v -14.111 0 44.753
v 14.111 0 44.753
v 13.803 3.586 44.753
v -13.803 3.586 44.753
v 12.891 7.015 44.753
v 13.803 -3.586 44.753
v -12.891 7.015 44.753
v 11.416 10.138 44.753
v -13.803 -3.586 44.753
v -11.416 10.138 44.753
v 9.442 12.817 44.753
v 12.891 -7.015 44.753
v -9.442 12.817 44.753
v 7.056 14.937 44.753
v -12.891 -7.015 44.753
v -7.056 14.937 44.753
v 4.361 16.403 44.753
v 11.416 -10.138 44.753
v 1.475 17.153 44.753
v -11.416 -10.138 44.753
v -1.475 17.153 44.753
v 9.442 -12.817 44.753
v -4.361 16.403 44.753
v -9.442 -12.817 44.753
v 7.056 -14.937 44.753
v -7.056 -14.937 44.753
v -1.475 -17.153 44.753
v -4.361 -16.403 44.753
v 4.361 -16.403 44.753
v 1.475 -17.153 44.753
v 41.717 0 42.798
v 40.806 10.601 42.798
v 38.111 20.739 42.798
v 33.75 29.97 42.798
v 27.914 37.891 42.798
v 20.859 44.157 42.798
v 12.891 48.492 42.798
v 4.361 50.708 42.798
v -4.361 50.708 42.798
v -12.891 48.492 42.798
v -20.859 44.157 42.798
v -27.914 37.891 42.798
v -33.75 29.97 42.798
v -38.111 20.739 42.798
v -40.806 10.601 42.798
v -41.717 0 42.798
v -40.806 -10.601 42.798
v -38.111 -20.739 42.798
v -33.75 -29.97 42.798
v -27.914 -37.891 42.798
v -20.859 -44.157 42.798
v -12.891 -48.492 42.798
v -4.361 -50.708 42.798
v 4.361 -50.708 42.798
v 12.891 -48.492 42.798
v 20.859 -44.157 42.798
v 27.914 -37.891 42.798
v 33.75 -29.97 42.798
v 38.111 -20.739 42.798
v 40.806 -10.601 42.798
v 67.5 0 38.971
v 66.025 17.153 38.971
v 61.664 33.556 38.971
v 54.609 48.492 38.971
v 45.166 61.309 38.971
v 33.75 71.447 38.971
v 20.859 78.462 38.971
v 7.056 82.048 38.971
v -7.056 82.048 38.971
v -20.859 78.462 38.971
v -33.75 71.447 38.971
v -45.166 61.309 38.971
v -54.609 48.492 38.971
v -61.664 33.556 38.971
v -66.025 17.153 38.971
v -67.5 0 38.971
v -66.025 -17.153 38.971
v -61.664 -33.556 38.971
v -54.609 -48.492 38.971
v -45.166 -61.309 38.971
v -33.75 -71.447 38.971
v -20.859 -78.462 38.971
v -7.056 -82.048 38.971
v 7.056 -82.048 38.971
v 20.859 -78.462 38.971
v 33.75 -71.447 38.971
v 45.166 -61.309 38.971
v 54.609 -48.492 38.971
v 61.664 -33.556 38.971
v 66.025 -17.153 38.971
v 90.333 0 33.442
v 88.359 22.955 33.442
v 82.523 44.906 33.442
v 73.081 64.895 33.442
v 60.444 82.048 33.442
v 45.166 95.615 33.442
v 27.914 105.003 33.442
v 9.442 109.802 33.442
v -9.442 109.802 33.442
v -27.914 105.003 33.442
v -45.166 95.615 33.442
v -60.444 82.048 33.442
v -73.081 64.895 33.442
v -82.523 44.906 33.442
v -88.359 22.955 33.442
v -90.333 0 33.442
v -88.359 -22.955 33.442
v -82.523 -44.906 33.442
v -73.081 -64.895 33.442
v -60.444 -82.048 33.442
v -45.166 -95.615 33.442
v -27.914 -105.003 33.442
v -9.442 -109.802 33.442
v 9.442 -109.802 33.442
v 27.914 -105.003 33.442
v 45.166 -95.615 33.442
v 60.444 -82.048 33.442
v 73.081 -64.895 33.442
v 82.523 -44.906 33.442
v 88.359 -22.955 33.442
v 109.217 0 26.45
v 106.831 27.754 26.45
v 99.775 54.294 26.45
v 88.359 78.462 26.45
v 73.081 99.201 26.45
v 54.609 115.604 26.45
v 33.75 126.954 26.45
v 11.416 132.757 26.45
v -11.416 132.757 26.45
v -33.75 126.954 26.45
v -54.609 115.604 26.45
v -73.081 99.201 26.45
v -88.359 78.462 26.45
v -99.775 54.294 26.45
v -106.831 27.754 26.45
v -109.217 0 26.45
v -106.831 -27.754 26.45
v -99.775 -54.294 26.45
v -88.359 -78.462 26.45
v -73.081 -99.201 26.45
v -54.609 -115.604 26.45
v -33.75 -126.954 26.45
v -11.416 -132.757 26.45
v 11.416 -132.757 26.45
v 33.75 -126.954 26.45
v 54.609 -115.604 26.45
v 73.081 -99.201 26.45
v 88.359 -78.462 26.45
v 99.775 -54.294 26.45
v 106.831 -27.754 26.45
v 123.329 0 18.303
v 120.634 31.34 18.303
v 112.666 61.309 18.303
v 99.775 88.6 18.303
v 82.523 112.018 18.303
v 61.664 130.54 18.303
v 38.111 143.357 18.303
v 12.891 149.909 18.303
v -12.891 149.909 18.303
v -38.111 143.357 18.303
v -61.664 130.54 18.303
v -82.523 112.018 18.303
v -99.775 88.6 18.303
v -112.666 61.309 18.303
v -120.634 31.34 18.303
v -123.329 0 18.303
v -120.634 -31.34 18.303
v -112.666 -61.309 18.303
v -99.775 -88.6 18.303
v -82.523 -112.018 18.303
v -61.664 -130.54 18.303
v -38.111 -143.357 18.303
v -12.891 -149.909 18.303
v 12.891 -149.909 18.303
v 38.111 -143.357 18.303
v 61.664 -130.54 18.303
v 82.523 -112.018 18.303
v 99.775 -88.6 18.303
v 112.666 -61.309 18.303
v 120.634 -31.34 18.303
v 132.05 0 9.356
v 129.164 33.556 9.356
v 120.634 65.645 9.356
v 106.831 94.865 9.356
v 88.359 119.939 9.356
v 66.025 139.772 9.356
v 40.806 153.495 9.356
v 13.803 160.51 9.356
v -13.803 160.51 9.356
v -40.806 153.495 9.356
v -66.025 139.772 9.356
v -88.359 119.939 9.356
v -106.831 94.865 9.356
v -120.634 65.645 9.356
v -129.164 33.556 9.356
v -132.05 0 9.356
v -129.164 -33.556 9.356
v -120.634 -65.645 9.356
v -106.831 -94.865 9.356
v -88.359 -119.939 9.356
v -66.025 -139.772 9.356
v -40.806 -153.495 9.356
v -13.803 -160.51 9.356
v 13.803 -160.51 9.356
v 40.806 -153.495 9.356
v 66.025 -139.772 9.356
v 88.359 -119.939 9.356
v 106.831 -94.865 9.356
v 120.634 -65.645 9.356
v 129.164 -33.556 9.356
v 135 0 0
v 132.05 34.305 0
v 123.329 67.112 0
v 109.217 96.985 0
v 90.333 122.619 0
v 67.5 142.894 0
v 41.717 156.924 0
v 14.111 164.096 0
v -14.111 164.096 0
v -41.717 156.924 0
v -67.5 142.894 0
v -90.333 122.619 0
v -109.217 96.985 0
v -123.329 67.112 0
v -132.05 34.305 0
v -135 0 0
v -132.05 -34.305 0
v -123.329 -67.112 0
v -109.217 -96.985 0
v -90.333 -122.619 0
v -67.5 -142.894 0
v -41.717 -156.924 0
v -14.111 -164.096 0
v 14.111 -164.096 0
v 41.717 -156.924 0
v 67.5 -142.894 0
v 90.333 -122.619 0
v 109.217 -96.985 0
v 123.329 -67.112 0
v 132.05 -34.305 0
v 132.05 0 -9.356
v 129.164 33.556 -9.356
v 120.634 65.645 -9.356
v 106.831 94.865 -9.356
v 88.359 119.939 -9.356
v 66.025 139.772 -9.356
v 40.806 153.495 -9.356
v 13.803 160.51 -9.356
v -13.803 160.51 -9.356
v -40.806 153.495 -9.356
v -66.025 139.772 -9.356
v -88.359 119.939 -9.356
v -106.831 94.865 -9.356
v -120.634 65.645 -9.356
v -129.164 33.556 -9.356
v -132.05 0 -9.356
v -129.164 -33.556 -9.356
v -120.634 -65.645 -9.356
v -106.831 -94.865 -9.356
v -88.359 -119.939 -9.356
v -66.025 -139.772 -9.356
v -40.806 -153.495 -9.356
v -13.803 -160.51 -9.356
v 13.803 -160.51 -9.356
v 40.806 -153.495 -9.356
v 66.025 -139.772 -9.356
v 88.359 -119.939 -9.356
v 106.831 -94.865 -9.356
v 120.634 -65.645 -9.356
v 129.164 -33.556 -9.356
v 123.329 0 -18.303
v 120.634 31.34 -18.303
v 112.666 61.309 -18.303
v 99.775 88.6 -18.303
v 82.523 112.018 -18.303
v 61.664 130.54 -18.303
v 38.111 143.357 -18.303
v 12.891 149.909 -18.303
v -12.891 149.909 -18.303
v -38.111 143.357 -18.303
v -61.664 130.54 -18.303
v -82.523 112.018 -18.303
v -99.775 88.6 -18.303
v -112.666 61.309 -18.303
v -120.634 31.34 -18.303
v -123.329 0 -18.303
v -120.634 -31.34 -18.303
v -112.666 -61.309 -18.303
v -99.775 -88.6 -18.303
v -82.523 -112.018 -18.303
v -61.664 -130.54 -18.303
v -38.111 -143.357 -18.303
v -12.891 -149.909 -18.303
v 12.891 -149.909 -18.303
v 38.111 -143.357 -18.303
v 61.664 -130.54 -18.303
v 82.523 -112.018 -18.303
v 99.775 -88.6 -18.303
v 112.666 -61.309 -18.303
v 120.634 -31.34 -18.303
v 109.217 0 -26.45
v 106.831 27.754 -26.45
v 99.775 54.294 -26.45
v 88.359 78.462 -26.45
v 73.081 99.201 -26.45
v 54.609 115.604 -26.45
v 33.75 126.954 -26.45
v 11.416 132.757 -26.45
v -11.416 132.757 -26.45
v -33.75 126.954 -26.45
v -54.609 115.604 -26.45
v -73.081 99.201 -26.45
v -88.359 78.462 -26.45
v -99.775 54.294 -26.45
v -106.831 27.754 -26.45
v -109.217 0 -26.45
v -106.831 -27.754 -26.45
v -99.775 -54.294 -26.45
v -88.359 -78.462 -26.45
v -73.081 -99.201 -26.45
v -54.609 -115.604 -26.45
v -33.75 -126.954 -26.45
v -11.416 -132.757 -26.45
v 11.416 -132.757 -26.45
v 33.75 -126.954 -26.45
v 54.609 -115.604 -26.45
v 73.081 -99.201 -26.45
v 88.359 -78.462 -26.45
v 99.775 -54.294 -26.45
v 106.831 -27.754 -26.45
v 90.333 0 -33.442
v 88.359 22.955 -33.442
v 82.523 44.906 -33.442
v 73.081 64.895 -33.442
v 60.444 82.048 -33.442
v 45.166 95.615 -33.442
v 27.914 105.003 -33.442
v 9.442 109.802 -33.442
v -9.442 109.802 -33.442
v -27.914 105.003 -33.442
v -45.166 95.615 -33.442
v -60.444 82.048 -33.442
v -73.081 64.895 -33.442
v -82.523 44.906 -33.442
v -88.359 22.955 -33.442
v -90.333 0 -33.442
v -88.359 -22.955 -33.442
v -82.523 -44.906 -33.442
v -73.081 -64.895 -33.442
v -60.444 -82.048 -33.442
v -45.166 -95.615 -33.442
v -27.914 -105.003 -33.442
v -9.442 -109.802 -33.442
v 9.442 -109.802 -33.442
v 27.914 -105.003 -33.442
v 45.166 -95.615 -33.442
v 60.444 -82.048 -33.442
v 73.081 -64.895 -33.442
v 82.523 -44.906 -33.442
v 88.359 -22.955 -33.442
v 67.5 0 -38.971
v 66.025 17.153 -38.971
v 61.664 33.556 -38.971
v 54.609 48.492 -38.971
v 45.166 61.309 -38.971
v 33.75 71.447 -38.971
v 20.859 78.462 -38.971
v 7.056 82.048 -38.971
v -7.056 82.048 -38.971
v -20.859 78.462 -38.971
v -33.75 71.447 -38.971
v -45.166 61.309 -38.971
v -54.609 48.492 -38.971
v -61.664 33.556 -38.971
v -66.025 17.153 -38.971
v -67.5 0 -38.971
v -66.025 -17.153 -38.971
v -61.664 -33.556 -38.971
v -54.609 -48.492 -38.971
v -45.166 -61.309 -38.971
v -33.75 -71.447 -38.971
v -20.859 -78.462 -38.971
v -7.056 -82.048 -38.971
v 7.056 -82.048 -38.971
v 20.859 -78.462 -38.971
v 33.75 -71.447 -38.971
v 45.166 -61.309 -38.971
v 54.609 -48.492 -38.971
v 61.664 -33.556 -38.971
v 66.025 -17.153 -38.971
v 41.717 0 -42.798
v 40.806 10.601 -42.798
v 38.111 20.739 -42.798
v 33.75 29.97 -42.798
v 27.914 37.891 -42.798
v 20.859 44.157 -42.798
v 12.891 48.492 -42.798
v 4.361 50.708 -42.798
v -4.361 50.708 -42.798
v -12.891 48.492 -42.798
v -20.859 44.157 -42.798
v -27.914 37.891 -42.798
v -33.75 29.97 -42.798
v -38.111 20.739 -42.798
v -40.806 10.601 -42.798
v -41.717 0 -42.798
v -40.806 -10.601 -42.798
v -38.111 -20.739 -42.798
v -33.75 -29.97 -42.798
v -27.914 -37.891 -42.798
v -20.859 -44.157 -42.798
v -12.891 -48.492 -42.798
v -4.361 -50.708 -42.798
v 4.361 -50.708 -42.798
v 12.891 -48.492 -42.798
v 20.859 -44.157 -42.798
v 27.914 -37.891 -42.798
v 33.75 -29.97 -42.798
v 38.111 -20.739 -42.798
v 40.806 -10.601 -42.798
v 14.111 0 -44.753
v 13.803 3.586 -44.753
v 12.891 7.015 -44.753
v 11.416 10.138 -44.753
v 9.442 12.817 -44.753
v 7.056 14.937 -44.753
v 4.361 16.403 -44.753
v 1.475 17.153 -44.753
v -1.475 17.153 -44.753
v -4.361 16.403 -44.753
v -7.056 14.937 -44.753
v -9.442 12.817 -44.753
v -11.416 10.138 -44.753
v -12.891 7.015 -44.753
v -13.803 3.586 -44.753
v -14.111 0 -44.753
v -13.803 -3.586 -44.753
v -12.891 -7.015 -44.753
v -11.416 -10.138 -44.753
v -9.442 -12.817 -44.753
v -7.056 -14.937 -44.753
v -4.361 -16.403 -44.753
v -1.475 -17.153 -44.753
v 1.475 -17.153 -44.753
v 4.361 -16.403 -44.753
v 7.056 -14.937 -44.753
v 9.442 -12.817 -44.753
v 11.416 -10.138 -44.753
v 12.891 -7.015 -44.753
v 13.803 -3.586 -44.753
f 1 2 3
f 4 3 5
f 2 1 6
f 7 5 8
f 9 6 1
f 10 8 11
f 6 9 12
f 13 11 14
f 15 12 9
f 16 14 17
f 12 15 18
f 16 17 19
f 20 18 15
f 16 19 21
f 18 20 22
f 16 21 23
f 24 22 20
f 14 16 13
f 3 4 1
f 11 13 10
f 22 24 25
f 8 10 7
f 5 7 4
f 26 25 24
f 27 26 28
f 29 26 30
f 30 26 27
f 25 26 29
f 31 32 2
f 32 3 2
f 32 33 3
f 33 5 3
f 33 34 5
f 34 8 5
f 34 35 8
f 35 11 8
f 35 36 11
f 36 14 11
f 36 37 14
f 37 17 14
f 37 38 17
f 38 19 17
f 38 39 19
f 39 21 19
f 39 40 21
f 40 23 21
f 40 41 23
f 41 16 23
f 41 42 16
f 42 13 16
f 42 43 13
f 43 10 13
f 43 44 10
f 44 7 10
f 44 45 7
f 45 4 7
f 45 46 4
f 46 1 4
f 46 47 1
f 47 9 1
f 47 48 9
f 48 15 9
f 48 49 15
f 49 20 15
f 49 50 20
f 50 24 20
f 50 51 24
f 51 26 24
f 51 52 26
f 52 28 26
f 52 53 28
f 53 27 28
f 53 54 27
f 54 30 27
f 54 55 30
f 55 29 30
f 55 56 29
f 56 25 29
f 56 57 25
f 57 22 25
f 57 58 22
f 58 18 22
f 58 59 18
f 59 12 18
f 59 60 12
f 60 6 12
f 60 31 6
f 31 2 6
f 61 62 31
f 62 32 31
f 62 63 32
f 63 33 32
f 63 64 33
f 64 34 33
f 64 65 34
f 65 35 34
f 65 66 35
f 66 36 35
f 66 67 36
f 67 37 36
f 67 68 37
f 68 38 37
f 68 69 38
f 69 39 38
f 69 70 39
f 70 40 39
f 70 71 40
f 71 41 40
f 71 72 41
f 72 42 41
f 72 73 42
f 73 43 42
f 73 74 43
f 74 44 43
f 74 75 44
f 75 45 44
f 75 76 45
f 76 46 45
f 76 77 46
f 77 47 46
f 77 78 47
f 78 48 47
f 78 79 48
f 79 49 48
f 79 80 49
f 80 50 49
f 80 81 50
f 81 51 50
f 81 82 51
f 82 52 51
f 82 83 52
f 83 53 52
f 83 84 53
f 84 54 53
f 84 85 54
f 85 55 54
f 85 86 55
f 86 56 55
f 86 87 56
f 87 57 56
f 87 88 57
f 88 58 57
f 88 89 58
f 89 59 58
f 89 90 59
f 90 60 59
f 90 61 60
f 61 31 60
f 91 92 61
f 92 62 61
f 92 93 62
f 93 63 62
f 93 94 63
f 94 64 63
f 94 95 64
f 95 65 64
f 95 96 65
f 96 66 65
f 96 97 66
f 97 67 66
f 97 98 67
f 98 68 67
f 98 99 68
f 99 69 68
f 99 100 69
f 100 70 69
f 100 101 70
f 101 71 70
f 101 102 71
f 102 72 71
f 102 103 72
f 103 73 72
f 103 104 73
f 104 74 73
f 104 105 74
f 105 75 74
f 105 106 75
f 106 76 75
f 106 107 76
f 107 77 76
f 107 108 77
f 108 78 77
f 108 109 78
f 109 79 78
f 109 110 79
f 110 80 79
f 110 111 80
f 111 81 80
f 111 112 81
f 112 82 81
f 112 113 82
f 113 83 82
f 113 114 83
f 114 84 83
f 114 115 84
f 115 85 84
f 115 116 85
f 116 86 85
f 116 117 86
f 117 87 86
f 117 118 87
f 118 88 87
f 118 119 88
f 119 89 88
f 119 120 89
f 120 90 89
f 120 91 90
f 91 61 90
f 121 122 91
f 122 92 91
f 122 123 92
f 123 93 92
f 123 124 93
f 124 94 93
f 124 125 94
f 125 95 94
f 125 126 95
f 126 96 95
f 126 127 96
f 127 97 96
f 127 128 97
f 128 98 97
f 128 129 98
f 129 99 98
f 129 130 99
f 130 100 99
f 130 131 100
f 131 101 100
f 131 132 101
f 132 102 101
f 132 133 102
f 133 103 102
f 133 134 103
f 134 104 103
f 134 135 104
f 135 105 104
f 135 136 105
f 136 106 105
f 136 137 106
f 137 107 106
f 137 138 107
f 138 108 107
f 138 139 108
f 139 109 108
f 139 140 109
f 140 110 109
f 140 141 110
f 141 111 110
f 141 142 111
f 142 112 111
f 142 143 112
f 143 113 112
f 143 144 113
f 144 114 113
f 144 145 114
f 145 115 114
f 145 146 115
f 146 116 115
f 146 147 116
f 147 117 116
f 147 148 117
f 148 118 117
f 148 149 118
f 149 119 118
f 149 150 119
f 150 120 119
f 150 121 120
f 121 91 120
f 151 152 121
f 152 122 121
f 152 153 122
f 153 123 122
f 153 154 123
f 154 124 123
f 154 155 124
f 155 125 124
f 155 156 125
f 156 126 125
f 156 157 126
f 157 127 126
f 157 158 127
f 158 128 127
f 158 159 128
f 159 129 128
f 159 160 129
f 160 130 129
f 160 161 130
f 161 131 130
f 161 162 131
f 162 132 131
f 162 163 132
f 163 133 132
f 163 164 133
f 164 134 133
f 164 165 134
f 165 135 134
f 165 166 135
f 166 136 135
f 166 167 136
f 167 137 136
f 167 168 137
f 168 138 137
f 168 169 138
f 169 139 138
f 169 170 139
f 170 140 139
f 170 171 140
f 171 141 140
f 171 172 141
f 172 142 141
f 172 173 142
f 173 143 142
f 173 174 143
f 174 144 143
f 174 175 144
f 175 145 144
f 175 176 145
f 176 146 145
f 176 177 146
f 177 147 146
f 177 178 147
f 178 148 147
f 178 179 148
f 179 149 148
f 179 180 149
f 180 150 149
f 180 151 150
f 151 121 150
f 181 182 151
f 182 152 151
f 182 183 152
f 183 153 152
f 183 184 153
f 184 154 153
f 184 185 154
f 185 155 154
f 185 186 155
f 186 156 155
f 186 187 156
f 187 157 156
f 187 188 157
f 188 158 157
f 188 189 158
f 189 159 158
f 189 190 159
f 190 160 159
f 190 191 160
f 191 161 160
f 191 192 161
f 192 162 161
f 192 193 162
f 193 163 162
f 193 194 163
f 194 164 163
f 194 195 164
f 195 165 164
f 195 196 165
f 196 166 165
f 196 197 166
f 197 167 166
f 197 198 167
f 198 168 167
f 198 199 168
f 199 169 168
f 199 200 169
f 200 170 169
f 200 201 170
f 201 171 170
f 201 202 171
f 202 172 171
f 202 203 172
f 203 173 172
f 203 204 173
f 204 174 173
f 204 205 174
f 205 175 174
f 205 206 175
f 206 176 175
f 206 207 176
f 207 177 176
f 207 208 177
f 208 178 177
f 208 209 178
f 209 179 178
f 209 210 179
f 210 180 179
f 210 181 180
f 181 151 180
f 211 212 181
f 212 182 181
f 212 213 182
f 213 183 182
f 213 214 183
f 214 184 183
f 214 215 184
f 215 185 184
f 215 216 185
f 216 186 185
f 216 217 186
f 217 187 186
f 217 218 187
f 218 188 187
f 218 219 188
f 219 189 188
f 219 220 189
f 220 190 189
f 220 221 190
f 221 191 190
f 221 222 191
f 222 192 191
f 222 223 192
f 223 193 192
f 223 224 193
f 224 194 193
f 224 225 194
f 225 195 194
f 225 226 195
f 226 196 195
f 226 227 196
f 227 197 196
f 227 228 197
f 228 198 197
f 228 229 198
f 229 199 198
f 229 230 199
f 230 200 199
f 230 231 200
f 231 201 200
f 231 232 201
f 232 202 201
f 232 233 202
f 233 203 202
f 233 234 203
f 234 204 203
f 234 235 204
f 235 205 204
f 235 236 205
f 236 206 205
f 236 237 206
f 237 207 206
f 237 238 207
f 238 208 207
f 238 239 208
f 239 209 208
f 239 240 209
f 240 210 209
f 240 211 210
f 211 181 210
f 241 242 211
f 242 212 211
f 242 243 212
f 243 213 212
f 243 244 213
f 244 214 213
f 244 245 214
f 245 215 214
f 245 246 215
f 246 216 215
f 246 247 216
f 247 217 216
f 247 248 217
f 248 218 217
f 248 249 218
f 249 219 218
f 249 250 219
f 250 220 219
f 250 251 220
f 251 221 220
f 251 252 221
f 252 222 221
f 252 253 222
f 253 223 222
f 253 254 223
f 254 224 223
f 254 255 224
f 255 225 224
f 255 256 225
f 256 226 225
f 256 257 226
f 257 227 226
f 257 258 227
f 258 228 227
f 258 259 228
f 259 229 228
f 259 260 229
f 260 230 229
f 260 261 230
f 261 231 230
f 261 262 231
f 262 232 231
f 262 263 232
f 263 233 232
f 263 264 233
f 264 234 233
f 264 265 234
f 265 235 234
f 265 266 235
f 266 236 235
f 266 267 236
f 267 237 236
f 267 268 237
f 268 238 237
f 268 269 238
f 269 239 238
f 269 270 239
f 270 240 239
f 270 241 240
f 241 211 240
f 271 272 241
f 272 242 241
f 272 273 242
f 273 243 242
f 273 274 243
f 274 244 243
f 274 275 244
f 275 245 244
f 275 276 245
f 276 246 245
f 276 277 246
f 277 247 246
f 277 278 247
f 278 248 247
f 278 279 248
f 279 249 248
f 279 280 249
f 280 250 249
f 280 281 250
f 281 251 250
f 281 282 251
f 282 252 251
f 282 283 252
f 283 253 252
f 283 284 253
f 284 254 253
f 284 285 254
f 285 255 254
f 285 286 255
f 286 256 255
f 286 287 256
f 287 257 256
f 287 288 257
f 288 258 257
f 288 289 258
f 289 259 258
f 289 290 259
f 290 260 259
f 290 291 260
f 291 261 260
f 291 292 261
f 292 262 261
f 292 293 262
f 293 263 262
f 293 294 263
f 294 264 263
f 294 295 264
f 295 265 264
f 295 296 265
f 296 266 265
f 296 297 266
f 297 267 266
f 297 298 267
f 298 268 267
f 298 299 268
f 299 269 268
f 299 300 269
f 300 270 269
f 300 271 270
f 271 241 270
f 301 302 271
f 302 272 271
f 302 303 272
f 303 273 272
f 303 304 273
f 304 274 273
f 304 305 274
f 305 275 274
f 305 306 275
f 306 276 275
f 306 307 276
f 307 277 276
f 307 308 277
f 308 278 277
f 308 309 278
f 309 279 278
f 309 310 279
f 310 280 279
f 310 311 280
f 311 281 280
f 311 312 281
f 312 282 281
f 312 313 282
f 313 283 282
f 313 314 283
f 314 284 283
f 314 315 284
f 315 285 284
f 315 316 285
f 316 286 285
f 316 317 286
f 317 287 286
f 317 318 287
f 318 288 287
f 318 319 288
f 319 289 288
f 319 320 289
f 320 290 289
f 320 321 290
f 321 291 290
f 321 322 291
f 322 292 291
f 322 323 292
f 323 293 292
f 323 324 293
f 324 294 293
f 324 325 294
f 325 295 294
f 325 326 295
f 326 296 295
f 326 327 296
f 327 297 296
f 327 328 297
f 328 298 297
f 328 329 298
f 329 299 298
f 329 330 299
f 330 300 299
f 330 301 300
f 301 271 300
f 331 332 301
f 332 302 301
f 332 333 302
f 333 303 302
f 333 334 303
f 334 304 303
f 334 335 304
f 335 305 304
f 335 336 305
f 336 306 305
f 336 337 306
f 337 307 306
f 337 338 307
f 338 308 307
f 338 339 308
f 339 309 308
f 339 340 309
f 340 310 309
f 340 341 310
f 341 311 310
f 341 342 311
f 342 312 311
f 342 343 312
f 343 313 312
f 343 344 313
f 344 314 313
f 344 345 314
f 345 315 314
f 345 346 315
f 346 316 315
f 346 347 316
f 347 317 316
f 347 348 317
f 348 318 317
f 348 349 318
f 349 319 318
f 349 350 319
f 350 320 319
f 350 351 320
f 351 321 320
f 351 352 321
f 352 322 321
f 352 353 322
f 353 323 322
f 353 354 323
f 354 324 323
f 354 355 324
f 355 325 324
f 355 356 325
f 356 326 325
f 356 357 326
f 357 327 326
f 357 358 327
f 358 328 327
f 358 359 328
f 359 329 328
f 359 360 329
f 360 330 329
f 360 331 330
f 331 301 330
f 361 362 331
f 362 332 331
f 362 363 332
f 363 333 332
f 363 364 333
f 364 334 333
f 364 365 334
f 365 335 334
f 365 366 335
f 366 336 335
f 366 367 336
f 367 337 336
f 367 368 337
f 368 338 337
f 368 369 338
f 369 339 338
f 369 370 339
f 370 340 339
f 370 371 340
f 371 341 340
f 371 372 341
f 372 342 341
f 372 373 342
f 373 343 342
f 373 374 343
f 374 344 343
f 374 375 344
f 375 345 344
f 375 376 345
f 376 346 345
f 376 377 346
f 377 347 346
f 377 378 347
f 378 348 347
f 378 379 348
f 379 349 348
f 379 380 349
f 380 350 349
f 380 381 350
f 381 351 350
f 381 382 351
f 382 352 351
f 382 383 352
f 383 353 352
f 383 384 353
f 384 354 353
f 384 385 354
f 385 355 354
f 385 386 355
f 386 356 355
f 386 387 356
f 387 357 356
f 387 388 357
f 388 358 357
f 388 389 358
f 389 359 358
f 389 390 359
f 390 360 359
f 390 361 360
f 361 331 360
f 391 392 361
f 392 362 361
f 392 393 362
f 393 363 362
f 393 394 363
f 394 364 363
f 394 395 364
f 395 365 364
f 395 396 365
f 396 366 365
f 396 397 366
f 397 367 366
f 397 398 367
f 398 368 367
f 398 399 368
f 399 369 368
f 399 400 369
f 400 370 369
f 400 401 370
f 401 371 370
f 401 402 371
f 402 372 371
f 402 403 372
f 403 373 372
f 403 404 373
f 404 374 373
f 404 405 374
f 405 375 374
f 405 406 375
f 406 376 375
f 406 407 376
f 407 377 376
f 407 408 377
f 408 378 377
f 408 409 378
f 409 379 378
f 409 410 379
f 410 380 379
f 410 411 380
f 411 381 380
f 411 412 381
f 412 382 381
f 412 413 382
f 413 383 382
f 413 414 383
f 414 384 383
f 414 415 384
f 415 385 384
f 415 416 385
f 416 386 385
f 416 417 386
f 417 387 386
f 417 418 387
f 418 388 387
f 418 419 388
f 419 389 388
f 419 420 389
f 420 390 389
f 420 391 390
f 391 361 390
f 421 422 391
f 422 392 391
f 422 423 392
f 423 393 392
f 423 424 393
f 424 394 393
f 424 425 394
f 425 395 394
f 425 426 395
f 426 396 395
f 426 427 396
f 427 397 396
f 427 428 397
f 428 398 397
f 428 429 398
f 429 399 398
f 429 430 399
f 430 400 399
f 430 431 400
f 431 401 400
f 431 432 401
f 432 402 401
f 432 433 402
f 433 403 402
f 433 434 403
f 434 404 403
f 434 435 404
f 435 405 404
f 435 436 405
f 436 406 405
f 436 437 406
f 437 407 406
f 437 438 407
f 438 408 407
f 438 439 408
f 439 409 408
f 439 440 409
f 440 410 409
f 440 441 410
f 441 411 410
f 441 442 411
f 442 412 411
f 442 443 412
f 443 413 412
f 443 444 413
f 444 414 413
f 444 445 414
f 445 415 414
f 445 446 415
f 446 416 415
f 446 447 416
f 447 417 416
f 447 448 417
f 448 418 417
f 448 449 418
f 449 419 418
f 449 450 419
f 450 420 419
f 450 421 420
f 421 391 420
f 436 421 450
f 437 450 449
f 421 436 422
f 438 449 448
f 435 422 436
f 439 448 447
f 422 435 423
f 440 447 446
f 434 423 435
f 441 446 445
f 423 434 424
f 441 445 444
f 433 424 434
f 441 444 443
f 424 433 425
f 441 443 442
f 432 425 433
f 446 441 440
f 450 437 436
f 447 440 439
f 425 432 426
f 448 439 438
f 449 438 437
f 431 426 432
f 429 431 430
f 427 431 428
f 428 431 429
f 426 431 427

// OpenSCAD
// Generated by SolidPython 1.0.1 on 2020-07-29 00:46:48


scale(v = [9, 11, 3]) {
	sphere(r = 15);
}
/***********************************************
*********      SolidPython code:      **********
************************************************
 
# import packages: SolidPython
from solid import *
from solid.utils import *
from itertools import chain, combinations, permutations


class Resize:

    def __init__(self, scad_file):
        self.scad_file = scad_file
        #self.scad_file = import_scad(scad_file)
        # cone/cylinder param:
        self.r1 = 0
        self.r2 = 0
        self.h = 0
        # rectangular prism param:
        self.w = 0
        self.l = 0
        # ellipse param:
        self.r = 0

    # import OpenScad code (file name corresponds to shape)


    # classify shape + parameters
    def assign(self, param1, param2, param3):
        if self.scad_file == 'cone.scad':
            self.r1 = param1
            self.r2 = param2
            self.h = param3
        elif self.scad_file == 'cylinder.scad':
            self.r1 = param1
            self.r2 = param2
            self.h = param3
        elif self.scad_file == 'rectangularPrism.scad':
            self.h = param1
            self.l = param2
            self.w = param3
        else:
            self.r = param1
            self.h = param2

    # resize parameters
    def iterate(self):
        x = range(3, 20, 2)
        i = 1
        if self.scad_file == 'cone.scad':
            tempList = list(permutations(x, 2))
            for temp in tempList:
                param1 = temp[0]
                param2 = temp[1]
                filepath = 'produced_scad_files/' + 'cone' + str(param1) + '_' + str(param2) + '_' + '.scad'
                scad_render_to_file(cylinder(h=param1, r1=param2, r2=0), filepath)

        elif self.scad_file == 'cylinder.scad':
            tempList = list(permutations(x, 3))
            for temp in tempList:
                param1 = temp[0]
                param2 = temp[1]
                filepath = 'produced_scad_files/' + 'cylinder' + str(param1) + '_' + str(param2) + '_' + '.scad'
                scad_render_to_file(cylinder(h=param1, r1=param2, r2=param2), filepath)

        elif self.scad_file == 'rectangularPrism.scad':
            tempList = list(permutations(x, 3))
            for temp in tempList:
                param1 = temp[0]
                param2 = temp[1]
                param3 = temp[2]
                filepath = 'produced_scad_files/' + 'rectangularPrism' + str(param1) + '_' + str(param2) + '_' + str(
                    param3) + '.scad'
                scad_render_to_file(cube(size=(param1, param2, param3)), filepath)

        elif self.scad_file == 'ellipse.scad':
            tempList = list(permutations(x, 4))
            for temp in tempList:
                param1 = temp[0]
                param2 = temp[1]
                param3 = temp[2]
                param4 = temp[3]
                filepath = 'produced_scad_files/' + 'ellipse' + str(param1) + '_' + str(param2) + '_' + str(param3) + '_' + str(param4) + '.scad'
                scad_render_to_file(scale([param1, param2, param3])(sphere(r=param4)), filepath)

    def render_to_scadfile(self):
        scad_render_to_file(scad, 'example.scad') 
 
************************************************/
